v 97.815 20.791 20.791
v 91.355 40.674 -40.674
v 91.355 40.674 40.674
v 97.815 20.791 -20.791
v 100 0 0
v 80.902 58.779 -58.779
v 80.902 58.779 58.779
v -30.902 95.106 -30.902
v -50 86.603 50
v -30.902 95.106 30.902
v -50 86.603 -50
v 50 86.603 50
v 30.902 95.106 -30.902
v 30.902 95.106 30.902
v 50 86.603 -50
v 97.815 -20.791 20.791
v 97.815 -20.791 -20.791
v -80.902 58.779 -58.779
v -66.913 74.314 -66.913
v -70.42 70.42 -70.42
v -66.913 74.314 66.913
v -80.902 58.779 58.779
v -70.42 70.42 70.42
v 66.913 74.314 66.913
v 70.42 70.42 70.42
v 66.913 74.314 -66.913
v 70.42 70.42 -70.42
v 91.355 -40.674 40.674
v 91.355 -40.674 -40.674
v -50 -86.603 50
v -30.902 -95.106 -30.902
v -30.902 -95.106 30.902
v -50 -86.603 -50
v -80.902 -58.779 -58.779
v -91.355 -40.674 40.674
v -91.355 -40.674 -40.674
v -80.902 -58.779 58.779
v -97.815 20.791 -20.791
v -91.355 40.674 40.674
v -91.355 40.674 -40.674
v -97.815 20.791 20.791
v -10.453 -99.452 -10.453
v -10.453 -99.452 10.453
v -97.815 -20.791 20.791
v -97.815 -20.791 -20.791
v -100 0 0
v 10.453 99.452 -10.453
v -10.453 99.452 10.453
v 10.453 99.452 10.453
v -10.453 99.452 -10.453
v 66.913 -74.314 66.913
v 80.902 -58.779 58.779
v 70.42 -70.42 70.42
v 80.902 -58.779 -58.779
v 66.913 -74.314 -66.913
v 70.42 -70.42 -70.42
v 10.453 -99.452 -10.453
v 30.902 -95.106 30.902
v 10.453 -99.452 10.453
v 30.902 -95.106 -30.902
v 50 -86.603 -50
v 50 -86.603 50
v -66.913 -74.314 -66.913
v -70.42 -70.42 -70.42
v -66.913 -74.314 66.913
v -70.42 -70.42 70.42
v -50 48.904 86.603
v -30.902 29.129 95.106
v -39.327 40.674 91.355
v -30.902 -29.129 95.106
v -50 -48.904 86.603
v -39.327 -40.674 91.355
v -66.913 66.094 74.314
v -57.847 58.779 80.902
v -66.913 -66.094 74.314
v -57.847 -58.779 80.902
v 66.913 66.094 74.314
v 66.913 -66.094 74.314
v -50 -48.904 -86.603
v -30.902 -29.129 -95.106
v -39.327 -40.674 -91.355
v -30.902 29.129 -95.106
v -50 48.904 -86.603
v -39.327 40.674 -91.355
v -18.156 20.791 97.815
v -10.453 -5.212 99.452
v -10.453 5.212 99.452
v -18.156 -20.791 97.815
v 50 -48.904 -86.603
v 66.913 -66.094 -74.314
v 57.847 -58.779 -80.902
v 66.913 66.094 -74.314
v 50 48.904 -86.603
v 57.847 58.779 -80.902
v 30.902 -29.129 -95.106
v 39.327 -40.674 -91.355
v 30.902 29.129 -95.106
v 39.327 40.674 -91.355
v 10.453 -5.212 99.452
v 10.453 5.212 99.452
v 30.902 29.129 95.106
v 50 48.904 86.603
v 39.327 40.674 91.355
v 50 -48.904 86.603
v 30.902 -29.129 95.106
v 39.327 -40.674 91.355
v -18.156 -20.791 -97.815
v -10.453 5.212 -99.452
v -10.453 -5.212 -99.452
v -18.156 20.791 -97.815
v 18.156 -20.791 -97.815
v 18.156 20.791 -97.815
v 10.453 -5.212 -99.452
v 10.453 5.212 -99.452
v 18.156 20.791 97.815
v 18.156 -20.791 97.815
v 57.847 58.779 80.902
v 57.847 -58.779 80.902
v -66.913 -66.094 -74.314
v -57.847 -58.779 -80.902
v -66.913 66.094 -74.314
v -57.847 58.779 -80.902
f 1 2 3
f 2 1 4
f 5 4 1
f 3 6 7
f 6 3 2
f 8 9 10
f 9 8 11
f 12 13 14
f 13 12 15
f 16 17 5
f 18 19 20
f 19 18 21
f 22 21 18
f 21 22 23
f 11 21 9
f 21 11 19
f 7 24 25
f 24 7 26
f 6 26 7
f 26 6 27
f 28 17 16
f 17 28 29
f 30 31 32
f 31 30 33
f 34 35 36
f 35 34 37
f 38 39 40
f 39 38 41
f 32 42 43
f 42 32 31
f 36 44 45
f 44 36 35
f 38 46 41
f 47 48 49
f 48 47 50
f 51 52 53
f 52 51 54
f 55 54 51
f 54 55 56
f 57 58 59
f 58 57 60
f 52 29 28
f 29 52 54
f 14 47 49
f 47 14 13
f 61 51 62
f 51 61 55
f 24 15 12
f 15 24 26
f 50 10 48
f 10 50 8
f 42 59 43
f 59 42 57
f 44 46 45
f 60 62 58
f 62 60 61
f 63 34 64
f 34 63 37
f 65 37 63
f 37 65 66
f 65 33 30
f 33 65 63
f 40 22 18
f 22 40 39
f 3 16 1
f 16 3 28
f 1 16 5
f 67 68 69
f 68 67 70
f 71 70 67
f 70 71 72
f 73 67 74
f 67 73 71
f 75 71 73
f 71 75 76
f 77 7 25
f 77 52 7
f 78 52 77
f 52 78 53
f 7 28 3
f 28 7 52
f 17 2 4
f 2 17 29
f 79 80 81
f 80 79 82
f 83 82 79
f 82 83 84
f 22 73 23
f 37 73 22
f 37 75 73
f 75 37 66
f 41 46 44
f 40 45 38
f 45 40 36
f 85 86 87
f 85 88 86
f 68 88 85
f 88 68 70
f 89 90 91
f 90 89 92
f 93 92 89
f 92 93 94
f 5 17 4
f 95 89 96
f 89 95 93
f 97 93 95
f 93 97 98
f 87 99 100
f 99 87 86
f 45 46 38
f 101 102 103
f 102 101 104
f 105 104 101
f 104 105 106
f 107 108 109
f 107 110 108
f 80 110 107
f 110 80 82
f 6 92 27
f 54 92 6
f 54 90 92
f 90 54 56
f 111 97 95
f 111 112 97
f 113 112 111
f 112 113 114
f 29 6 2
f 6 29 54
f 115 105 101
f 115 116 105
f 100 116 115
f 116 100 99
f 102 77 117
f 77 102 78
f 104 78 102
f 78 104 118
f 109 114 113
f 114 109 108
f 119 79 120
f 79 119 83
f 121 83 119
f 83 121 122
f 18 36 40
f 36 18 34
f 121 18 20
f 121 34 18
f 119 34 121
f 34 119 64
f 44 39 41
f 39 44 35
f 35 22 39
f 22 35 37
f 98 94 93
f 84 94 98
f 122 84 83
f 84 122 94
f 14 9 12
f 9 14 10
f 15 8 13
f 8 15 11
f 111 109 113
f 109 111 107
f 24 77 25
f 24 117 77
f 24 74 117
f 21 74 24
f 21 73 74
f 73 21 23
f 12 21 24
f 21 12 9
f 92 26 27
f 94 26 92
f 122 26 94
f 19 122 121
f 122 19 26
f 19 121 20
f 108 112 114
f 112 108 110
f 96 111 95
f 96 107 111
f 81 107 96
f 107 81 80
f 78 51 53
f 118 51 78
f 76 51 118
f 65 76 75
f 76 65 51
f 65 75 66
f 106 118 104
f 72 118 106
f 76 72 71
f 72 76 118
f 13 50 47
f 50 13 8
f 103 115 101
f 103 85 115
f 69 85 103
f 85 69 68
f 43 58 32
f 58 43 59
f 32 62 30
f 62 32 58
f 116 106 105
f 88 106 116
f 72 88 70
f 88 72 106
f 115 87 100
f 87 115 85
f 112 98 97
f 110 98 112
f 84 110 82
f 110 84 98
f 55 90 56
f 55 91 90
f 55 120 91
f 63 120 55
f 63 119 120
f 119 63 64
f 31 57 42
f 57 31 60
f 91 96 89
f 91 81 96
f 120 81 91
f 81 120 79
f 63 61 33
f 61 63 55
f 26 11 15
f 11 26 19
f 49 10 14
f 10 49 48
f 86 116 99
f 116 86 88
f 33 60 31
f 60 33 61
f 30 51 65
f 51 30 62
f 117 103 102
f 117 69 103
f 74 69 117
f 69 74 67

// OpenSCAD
size = 100;
$fs = 1;

intersection() {
	cylinder(size * 2, size, size, true);
	rotate([90, 0, 0])
		cylinder(size * 2, size, size, true);
	rotate([0, 90, 0])
		cylinder(size * 2, size, size, true);
}
